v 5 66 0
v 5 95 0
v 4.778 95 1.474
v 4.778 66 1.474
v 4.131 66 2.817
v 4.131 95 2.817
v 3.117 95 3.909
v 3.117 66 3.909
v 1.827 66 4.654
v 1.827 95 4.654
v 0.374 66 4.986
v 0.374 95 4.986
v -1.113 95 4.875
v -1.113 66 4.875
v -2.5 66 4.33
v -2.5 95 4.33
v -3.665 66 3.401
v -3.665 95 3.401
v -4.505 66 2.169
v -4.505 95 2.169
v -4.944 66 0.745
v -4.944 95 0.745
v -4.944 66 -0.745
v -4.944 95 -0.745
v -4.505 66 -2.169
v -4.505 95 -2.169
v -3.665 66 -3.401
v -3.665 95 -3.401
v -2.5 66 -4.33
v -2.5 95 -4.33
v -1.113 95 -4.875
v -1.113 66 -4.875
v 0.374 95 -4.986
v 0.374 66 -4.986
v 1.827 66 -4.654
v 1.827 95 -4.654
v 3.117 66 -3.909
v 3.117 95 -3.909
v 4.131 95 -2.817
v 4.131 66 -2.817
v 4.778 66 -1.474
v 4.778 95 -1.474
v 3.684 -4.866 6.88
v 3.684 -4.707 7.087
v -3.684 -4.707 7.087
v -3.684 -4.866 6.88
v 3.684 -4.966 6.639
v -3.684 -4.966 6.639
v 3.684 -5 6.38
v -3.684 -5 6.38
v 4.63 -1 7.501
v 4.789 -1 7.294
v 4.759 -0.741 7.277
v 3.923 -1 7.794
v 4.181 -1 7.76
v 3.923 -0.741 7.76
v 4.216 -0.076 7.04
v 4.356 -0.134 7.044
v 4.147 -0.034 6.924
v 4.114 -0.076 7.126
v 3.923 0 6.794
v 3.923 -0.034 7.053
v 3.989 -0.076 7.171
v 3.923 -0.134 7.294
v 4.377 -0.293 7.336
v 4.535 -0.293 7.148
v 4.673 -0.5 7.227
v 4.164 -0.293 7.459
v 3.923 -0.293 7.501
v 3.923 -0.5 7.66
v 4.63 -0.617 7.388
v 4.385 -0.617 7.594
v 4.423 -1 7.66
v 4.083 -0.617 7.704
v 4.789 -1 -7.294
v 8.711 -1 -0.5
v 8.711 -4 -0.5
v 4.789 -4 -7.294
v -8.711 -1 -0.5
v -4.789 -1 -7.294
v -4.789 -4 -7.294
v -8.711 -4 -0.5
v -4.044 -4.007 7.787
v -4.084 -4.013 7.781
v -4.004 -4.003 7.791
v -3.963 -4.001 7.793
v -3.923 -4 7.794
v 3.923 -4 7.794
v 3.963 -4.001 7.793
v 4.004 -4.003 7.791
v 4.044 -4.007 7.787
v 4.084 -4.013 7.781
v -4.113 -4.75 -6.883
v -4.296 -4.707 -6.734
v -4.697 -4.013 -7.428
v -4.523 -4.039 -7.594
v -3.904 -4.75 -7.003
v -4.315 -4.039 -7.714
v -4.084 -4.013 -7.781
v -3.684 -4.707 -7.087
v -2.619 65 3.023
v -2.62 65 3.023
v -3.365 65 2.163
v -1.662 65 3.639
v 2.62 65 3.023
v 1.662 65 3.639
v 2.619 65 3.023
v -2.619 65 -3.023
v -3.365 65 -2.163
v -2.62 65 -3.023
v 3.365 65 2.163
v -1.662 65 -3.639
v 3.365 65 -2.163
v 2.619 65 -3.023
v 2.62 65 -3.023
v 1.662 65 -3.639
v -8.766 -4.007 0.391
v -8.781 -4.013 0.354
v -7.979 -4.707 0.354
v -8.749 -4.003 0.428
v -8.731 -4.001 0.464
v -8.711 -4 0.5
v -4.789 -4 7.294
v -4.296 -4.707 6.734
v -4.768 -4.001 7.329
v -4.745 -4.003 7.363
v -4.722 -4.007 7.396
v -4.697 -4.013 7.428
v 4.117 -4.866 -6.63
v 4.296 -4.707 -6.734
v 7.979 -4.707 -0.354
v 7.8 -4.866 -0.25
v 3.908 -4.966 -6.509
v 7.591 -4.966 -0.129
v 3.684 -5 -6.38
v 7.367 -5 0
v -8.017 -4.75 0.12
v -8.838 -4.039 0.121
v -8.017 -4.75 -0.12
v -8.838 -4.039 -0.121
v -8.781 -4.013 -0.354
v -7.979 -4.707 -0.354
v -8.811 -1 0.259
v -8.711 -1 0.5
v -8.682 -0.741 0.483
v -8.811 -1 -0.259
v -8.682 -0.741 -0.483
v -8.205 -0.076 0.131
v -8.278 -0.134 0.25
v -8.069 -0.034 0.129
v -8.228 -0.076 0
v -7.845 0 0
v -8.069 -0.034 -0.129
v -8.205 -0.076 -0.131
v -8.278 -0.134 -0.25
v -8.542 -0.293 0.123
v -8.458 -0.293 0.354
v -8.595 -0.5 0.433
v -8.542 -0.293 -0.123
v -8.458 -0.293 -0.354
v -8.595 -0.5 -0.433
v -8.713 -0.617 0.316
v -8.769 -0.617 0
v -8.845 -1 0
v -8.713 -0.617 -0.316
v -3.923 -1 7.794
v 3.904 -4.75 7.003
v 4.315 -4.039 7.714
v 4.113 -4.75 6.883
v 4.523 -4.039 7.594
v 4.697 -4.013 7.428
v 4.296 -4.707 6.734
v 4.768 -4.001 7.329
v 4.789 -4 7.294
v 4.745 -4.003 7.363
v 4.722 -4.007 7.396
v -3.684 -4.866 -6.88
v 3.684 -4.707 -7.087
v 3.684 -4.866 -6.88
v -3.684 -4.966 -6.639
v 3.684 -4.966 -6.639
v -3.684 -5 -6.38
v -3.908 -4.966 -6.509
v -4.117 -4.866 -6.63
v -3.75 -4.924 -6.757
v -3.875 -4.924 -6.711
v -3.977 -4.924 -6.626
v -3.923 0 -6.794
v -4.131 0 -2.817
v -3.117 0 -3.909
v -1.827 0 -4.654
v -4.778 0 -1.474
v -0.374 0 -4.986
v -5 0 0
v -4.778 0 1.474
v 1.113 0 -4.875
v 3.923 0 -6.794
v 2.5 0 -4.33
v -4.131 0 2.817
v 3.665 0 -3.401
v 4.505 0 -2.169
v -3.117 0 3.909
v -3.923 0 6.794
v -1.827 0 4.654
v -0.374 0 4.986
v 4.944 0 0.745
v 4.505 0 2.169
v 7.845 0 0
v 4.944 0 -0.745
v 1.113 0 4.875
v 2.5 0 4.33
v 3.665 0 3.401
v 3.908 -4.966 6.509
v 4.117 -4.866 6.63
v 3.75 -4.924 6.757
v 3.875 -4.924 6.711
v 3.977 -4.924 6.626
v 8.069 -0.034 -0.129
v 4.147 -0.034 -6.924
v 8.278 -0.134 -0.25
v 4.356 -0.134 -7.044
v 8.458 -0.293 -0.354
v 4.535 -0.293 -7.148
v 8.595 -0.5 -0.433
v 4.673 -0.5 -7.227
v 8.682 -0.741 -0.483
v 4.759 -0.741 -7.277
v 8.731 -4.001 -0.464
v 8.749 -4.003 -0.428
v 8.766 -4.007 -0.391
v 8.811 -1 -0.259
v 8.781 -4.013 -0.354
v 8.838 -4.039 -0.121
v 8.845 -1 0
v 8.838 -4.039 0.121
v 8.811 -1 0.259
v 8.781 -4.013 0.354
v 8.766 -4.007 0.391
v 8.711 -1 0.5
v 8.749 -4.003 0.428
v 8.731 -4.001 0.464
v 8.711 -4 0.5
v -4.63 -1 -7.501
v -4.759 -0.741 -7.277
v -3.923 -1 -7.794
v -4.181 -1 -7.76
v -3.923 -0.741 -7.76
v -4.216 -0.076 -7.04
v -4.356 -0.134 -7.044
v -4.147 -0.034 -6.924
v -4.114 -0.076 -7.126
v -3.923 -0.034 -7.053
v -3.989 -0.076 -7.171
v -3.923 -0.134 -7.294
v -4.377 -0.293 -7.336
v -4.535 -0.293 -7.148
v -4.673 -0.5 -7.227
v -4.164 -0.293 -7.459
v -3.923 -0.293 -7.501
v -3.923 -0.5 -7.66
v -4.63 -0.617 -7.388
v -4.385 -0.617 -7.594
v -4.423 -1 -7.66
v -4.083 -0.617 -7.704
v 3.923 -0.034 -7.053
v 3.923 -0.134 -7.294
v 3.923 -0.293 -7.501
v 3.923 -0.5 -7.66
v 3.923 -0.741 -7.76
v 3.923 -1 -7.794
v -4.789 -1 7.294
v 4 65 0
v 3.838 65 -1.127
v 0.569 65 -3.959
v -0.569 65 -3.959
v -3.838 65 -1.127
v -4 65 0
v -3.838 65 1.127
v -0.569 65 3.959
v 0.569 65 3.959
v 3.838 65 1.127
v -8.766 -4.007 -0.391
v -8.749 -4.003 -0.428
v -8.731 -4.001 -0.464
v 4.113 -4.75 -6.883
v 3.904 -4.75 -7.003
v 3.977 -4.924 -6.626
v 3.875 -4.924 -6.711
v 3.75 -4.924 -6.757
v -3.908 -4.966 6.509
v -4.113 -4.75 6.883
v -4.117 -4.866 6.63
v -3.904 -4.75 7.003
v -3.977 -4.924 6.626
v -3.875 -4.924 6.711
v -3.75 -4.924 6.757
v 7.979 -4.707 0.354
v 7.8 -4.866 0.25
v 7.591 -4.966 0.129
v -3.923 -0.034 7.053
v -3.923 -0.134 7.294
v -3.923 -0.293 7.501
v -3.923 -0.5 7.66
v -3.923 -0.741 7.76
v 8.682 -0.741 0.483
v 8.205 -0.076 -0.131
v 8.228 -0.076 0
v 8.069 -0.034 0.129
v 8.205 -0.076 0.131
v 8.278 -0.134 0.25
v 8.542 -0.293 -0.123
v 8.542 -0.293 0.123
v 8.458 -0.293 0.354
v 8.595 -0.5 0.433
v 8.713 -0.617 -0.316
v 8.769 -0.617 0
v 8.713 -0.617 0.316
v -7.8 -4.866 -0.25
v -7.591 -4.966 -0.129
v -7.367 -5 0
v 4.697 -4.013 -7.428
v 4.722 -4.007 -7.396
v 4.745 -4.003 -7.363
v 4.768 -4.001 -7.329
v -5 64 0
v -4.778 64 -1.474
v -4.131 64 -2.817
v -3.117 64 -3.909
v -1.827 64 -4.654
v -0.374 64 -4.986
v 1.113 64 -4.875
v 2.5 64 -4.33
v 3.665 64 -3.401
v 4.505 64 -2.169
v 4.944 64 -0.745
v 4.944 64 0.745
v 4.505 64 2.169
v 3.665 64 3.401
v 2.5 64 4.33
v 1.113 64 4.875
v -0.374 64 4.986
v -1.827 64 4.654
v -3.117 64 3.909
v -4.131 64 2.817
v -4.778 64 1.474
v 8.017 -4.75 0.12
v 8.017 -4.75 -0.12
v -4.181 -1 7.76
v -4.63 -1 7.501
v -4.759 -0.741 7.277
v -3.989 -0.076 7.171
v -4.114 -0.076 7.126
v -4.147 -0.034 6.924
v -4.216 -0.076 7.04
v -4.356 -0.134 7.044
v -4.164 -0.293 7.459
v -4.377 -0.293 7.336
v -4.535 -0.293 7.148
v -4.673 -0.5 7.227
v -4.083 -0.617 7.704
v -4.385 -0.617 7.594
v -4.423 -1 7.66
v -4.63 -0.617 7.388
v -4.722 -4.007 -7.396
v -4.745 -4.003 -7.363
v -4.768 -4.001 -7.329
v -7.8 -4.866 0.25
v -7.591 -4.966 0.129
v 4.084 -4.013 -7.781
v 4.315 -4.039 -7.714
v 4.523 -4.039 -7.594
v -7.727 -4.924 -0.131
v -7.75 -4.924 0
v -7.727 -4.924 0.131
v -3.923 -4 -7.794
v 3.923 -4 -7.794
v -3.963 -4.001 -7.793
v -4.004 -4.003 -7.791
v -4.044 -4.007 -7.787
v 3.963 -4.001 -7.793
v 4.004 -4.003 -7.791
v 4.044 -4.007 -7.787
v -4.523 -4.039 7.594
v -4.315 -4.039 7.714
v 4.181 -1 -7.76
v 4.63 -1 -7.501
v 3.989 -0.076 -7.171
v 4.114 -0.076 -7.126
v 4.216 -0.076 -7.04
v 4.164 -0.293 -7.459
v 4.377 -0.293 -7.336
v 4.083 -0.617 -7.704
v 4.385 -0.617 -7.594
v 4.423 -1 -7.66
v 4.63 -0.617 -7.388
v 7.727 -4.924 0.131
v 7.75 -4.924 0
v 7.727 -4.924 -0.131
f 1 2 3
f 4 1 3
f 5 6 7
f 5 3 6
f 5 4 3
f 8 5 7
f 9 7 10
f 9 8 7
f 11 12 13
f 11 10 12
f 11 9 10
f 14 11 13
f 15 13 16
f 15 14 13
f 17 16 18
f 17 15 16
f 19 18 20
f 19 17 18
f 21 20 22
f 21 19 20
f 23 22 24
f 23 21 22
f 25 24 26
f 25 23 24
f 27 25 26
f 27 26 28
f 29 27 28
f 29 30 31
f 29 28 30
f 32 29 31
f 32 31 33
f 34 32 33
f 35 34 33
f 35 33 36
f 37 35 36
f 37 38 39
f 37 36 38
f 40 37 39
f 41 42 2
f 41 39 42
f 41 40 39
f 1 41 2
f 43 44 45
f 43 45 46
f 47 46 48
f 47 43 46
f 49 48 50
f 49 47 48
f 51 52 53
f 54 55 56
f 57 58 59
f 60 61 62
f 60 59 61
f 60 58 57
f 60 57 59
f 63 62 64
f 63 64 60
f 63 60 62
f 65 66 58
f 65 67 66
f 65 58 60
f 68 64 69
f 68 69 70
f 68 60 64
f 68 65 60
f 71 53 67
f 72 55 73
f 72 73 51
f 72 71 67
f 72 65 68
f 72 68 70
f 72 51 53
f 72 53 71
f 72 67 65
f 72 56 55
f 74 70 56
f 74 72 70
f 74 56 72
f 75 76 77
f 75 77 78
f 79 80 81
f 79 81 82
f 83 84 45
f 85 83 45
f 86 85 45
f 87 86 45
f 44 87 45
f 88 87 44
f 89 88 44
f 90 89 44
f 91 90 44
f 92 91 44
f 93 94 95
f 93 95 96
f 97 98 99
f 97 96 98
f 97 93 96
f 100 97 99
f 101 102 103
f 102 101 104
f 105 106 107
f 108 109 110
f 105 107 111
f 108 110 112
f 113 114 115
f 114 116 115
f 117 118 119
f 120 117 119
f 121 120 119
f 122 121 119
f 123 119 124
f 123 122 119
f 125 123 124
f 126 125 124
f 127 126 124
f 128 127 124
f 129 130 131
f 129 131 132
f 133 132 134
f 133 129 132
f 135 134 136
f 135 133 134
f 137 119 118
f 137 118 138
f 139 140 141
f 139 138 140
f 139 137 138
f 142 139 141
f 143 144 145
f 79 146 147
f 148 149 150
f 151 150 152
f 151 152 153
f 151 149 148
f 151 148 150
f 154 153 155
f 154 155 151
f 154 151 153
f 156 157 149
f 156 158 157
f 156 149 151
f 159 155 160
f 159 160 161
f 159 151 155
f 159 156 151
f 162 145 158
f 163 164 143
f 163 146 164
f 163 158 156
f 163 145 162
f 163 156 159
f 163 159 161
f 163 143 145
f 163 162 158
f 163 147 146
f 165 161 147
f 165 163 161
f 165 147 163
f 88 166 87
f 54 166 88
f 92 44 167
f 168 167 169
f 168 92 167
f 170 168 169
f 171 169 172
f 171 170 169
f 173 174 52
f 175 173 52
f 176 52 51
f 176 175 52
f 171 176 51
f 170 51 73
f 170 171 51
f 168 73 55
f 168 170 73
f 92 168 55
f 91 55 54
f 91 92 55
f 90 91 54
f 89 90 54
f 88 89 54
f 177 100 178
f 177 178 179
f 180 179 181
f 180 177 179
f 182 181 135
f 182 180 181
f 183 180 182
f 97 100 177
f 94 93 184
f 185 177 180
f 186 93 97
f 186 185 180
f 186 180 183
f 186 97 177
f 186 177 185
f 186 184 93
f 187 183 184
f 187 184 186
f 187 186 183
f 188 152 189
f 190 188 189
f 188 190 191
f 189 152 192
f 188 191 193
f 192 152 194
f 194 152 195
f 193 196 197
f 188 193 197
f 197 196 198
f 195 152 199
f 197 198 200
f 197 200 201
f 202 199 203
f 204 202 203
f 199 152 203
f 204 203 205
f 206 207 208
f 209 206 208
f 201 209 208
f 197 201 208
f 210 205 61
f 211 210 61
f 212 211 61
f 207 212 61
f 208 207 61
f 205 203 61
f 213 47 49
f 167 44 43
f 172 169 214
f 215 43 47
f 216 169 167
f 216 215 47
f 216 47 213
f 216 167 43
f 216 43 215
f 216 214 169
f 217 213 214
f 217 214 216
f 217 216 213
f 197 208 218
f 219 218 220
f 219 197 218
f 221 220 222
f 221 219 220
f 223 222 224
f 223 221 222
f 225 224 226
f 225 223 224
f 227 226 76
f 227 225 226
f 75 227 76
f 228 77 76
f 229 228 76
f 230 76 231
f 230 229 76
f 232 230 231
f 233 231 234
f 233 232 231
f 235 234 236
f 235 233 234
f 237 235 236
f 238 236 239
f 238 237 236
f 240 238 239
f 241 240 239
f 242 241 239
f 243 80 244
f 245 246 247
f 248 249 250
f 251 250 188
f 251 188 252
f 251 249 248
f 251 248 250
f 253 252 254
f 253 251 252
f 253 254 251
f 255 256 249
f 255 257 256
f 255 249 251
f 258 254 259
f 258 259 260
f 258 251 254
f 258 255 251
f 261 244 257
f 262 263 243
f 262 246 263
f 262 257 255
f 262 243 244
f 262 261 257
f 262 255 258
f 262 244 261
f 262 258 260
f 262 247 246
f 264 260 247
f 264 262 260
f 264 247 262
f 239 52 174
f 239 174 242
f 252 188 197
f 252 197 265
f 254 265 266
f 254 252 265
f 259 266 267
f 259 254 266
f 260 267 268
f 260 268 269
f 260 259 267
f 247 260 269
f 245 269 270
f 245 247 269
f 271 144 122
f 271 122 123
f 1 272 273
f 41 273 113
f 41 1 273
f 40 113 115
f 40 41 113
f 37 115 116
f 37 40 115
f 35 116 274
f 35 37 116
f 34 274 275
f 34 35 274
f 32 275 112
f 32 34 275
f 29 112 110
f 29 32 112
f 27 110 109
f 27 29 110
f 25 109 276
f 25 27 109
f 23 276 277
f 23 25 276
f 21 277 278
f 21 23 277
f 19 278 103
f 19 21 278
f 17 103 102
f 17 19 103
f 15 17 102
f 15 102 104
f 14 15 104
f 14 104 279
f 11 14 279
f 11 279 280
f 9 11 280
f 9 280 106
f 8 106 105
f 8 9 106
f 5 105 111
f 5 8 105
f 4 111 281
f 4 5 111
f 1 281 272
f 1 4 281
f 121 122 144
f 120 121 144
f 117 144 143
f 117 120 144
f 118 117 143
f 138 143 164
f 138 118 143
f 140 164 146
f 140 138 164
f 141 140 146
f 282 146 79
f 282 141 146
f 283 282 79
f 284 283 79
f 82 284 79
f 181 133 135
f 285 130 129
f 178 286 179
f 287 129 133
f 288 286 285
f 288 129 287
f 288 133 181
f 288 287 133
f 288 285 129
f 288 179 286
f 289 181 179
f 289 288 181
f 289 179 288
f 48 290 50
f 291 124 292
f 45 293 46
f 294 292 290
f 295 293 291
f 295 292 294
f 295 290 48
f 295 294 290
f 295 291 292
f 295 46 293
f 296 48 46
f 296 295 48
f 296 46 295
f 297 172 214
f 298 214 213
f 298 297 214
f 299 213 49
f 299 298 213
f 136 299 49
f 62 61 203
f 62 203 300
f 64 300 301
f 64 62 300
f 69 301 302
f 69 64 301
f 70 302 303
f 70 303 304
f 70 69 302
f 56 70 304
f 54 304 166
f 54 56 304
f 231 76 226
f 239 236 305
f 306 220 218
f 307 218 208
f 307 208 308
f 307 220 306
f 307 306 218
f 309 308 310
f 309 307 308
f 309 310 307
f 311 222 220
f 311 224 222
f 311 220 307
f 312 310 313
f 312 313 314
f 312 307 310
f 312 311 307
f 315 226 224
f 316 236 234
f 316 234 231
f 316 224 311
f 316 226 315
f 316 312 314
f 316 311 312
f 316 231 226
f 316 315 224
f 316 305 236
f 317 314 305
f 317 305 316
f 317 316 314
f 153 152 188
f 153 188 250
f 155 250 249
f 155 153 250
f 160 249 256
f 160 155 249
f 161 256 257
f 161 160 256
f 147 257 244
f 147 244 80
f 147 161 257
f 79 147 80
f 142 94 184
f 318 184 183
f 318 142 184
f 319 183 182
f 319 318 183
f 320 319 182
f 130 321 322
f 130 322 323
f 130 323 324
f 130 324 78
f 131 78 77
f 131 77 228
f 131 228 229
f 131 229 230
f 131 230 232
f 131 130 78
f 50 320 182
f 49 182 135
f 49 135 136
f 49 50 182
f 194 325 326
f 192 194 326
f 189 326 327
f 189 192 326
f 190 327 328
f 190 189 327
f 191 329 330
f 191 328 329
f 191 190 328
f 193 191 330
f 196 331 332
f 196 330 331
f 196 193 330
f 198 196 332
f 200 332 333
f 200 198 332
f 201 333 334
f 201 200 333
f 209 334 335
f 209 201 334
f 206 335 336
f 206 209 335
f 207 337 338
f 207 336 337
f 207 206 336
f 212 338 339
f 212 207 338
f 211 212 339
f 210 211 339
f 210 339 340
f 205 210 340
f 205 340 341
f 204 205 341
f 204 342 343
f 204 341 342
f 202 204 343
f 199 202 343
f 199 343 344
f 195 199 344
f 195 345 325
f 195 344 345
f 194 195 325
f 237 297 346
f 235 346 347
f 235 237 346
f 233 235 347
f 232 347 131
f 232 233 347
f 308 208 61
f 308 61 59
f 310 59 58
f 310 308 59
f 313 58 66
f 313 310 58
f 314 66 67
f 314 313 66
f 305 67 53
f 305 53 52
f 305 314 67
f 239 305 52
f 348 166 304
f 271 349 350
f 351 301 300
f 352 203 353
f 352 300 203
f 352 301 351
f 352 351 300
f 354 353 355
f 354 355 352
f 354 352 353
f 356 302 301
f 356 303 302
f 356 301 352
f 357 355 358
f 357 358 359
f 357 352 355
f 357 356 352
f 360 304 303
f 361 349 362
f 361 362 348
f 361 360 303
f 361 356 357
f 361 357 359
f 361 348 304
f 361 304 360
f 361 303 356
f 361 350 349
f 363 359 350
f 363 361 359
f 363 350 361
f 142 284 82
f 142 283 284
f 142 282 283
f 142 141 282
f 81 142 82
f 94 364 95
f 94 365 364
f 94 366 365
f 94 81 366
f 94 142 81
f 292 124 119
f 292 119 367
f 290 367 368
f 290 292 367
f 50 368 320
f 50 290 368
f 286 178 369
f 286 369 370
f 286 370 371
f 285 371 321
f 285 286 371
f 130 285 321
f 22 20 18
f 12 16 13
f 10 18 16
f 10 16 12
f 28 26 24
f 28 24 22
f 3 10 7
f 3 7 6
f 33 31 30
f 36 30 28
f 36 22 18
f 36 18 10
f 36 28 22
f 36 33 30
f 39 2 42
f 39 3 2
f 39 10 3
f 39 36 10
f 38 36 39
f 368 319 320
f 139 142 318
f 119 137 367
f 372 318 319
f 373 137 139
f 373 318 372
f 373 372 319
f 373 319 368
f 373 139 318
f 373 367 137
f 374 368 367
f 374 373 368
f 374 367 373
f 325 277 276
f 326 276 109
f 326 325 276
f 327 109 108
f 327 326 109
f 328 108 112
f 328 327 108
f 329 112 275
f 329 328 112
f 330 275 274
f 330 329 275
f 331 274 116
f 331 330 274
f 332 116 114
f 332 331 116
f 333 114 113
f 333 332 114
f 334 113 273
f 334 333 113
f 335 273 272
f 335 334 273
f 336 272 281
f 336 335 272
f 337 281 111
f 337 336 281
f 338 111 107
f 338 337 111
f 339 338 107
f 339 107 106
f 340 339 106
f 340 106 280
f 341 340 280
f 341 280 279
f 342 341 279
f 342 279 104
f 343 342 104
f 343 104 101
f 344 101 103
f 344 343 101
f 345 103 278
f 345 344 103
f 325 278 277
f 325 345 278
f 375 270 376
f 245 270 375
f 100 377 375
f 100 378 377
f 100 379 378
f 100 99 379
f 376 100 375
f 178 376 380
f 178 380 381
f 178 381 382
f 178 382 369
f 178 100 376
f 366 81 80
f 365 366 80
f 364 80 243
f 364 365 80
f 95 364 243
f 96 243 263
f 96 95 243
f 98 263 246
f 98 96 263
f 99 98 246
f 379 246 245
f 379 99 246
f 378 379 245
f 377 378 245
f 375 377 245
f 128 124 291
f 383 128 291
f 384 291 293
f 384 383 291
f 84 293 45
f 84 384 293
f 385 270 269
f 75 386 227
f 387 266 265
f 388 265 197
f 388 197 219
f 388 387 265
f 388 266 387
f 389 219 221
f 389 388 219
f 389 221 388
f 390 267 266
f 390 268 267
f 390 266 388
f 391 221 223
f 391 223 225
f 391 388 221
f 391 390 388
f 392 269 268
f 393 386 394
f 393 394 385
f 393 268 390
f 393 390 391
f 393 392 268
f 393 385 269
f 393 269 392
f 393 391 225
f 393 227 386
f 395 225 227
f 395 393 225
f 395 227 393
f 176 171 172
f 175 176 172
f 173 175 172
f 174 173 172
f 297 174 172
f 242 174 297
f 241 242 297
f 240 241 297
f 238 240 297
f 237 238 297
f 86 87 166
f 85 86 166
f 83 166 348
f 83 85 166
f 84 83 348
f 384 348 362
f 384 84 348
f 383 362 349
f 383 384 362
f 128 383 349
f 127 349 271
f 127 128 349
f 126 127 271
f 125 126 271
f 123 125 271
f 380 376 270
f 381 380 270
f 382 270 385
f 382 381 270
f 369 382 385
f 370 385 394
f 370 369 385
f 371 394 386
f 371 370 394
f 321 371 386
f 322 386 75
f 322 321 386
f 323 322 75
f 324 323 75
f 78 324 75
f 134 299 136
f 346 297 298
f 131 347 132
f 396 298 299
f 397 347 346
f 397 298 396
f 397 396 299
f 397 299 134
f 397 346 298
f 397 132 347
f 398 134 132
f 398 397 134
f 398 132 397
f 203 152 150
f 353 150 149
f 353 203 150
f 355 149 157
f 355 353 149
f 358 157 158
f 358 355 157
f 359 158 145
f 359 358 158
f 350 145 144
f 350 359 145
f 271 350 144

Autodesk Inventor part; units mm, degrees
ref_plane "YZ Plane" through (0, 0, 0) normal (1, 0, 0) x (0, 1, 0)
ref_plane "XZ Plane" through (0, 0, 0) normal (0, 1, 0) x (-1, 0, 0)
ref_plane "XY Plane" through (0, 0, 0) normal (0, 0, 1) x (1, 0, 0)
sketch "Sketch1" plane through (0, 0, 0) normal (0, 1, 0) x (-1, 0, 0)
  circle A0 centre (0, 0) radius 5
  dimension "d0" = 10
extrude "Extrusion1" add sketch "Sketch1" along normal blind 65
sketch "Sketch2" plane through (0, 65, 0) normal (0, 1, 0) x (1, 0, 0)
  circle A0 centre (0, 0) radius 5 projected
  dimension "d38" = 10
chamfer "Chamfer1" distance 1 angle 45 1 edges at (5, 65, 0)
extrude "Extrusion2" add sketch "Sketch2" along normal blind 30
chamfer "Chamfer2" distance 1 angle 45 1 edges at (-5, 65, 0)
sketch "Sketch3" plane through (0, 0, 0) normal (0, -1, 0) x (1, 0, 0)
  line L0 (0, 0) -> (0, 0) construction
  line L1 (4.5, -7.7942) -> (-4.5, -7.7942)
  line L2 (-4.5, -7.7942) -> (-9, 0)
  line L3 (-9, 0) -> (-4.5, 7.7942)
  line L4 (-4.5, 7.7942) -> (4.5, 7.7942)
  line L5 (4.5, 7.7942) -> (9, 0)
  line L6 (9, 0) -> (4.5, -7.7942)
  circle A0 centre (0, 0) radius 5 projected
  line L7 (-4.5, -7.7942) -> (4.5, 7.7942) construction
  line L8 (-4.5, 7.7942) -> (4.5, -7.7942) construction
  dimension "d21" = 9
  dimension "d22" = 9
  dimension "d23" = 120
  dimension "d24" = 9
  dimension "d25" = 9
  dimension "d26" = 120
  dimension "d34" = 9
  dimension "d36" = 0
  dimension "d37" = 0
extrude "Extrusion3" add sketch "Sketch3" along normal blind 5 contours L1 L2 L3 L4 L5 L6 | A0
chamfer "Chamfer3" distance 1 angle 45 6 edges at (0, -5, -7.7942) (-6.75, -5, -3.8971) (-6.75, -5, 3.8971) (0, -5, 7.7942) (6.75, -5, 3.8971) (6.75, -5, -3.8971)
fillet "Fillet1" radius 1 12 edges at (-4.2113, -4.5, -7.2942) (4.2113, -4.5, -7.2942) (8.4226, -4.5, 0) (4.2113, -4.5, 7.2942) (-4.2113, -4.5, 7.2942) (-8.4226, -4.5, 0) (-5.884, -5, -3.3971) (-5.884, -5, 3.3971) (0, -5, 6.7942) (5.884, -5, 3.3971) (5.884, -5, -3.3971) (0, -5, -6.7942)
fillet "Fillet2" radius 1 12 edges at (4.5, -1.9543, -7.7942) (9, -1.9543, 0) (4.5, -1.9543, 7.7942) (-4.5, -1.9543, 7.7942) (-9, -1.9543, 0) (-4.5, -1.9543, -7.7942) (-6.75, 0, 3.8971) (-6.75, 0, -3.8971) (0, 0, 7.7942) (6.75, 0, 3.8971) (6.75, 0, -3.8971) (0, 0, -7.7942)
thread "Thread3" size "7/16-14 UNC" class "2A" standard "ANSI Unified Screw Threads" full length
equation "\"d21\" = d24"
equation "\"d22\" = d24"
equation "\"d25\" = d24"
properties part number "CIM Mount Bolt" material "Aluminum 6061-AHC"
